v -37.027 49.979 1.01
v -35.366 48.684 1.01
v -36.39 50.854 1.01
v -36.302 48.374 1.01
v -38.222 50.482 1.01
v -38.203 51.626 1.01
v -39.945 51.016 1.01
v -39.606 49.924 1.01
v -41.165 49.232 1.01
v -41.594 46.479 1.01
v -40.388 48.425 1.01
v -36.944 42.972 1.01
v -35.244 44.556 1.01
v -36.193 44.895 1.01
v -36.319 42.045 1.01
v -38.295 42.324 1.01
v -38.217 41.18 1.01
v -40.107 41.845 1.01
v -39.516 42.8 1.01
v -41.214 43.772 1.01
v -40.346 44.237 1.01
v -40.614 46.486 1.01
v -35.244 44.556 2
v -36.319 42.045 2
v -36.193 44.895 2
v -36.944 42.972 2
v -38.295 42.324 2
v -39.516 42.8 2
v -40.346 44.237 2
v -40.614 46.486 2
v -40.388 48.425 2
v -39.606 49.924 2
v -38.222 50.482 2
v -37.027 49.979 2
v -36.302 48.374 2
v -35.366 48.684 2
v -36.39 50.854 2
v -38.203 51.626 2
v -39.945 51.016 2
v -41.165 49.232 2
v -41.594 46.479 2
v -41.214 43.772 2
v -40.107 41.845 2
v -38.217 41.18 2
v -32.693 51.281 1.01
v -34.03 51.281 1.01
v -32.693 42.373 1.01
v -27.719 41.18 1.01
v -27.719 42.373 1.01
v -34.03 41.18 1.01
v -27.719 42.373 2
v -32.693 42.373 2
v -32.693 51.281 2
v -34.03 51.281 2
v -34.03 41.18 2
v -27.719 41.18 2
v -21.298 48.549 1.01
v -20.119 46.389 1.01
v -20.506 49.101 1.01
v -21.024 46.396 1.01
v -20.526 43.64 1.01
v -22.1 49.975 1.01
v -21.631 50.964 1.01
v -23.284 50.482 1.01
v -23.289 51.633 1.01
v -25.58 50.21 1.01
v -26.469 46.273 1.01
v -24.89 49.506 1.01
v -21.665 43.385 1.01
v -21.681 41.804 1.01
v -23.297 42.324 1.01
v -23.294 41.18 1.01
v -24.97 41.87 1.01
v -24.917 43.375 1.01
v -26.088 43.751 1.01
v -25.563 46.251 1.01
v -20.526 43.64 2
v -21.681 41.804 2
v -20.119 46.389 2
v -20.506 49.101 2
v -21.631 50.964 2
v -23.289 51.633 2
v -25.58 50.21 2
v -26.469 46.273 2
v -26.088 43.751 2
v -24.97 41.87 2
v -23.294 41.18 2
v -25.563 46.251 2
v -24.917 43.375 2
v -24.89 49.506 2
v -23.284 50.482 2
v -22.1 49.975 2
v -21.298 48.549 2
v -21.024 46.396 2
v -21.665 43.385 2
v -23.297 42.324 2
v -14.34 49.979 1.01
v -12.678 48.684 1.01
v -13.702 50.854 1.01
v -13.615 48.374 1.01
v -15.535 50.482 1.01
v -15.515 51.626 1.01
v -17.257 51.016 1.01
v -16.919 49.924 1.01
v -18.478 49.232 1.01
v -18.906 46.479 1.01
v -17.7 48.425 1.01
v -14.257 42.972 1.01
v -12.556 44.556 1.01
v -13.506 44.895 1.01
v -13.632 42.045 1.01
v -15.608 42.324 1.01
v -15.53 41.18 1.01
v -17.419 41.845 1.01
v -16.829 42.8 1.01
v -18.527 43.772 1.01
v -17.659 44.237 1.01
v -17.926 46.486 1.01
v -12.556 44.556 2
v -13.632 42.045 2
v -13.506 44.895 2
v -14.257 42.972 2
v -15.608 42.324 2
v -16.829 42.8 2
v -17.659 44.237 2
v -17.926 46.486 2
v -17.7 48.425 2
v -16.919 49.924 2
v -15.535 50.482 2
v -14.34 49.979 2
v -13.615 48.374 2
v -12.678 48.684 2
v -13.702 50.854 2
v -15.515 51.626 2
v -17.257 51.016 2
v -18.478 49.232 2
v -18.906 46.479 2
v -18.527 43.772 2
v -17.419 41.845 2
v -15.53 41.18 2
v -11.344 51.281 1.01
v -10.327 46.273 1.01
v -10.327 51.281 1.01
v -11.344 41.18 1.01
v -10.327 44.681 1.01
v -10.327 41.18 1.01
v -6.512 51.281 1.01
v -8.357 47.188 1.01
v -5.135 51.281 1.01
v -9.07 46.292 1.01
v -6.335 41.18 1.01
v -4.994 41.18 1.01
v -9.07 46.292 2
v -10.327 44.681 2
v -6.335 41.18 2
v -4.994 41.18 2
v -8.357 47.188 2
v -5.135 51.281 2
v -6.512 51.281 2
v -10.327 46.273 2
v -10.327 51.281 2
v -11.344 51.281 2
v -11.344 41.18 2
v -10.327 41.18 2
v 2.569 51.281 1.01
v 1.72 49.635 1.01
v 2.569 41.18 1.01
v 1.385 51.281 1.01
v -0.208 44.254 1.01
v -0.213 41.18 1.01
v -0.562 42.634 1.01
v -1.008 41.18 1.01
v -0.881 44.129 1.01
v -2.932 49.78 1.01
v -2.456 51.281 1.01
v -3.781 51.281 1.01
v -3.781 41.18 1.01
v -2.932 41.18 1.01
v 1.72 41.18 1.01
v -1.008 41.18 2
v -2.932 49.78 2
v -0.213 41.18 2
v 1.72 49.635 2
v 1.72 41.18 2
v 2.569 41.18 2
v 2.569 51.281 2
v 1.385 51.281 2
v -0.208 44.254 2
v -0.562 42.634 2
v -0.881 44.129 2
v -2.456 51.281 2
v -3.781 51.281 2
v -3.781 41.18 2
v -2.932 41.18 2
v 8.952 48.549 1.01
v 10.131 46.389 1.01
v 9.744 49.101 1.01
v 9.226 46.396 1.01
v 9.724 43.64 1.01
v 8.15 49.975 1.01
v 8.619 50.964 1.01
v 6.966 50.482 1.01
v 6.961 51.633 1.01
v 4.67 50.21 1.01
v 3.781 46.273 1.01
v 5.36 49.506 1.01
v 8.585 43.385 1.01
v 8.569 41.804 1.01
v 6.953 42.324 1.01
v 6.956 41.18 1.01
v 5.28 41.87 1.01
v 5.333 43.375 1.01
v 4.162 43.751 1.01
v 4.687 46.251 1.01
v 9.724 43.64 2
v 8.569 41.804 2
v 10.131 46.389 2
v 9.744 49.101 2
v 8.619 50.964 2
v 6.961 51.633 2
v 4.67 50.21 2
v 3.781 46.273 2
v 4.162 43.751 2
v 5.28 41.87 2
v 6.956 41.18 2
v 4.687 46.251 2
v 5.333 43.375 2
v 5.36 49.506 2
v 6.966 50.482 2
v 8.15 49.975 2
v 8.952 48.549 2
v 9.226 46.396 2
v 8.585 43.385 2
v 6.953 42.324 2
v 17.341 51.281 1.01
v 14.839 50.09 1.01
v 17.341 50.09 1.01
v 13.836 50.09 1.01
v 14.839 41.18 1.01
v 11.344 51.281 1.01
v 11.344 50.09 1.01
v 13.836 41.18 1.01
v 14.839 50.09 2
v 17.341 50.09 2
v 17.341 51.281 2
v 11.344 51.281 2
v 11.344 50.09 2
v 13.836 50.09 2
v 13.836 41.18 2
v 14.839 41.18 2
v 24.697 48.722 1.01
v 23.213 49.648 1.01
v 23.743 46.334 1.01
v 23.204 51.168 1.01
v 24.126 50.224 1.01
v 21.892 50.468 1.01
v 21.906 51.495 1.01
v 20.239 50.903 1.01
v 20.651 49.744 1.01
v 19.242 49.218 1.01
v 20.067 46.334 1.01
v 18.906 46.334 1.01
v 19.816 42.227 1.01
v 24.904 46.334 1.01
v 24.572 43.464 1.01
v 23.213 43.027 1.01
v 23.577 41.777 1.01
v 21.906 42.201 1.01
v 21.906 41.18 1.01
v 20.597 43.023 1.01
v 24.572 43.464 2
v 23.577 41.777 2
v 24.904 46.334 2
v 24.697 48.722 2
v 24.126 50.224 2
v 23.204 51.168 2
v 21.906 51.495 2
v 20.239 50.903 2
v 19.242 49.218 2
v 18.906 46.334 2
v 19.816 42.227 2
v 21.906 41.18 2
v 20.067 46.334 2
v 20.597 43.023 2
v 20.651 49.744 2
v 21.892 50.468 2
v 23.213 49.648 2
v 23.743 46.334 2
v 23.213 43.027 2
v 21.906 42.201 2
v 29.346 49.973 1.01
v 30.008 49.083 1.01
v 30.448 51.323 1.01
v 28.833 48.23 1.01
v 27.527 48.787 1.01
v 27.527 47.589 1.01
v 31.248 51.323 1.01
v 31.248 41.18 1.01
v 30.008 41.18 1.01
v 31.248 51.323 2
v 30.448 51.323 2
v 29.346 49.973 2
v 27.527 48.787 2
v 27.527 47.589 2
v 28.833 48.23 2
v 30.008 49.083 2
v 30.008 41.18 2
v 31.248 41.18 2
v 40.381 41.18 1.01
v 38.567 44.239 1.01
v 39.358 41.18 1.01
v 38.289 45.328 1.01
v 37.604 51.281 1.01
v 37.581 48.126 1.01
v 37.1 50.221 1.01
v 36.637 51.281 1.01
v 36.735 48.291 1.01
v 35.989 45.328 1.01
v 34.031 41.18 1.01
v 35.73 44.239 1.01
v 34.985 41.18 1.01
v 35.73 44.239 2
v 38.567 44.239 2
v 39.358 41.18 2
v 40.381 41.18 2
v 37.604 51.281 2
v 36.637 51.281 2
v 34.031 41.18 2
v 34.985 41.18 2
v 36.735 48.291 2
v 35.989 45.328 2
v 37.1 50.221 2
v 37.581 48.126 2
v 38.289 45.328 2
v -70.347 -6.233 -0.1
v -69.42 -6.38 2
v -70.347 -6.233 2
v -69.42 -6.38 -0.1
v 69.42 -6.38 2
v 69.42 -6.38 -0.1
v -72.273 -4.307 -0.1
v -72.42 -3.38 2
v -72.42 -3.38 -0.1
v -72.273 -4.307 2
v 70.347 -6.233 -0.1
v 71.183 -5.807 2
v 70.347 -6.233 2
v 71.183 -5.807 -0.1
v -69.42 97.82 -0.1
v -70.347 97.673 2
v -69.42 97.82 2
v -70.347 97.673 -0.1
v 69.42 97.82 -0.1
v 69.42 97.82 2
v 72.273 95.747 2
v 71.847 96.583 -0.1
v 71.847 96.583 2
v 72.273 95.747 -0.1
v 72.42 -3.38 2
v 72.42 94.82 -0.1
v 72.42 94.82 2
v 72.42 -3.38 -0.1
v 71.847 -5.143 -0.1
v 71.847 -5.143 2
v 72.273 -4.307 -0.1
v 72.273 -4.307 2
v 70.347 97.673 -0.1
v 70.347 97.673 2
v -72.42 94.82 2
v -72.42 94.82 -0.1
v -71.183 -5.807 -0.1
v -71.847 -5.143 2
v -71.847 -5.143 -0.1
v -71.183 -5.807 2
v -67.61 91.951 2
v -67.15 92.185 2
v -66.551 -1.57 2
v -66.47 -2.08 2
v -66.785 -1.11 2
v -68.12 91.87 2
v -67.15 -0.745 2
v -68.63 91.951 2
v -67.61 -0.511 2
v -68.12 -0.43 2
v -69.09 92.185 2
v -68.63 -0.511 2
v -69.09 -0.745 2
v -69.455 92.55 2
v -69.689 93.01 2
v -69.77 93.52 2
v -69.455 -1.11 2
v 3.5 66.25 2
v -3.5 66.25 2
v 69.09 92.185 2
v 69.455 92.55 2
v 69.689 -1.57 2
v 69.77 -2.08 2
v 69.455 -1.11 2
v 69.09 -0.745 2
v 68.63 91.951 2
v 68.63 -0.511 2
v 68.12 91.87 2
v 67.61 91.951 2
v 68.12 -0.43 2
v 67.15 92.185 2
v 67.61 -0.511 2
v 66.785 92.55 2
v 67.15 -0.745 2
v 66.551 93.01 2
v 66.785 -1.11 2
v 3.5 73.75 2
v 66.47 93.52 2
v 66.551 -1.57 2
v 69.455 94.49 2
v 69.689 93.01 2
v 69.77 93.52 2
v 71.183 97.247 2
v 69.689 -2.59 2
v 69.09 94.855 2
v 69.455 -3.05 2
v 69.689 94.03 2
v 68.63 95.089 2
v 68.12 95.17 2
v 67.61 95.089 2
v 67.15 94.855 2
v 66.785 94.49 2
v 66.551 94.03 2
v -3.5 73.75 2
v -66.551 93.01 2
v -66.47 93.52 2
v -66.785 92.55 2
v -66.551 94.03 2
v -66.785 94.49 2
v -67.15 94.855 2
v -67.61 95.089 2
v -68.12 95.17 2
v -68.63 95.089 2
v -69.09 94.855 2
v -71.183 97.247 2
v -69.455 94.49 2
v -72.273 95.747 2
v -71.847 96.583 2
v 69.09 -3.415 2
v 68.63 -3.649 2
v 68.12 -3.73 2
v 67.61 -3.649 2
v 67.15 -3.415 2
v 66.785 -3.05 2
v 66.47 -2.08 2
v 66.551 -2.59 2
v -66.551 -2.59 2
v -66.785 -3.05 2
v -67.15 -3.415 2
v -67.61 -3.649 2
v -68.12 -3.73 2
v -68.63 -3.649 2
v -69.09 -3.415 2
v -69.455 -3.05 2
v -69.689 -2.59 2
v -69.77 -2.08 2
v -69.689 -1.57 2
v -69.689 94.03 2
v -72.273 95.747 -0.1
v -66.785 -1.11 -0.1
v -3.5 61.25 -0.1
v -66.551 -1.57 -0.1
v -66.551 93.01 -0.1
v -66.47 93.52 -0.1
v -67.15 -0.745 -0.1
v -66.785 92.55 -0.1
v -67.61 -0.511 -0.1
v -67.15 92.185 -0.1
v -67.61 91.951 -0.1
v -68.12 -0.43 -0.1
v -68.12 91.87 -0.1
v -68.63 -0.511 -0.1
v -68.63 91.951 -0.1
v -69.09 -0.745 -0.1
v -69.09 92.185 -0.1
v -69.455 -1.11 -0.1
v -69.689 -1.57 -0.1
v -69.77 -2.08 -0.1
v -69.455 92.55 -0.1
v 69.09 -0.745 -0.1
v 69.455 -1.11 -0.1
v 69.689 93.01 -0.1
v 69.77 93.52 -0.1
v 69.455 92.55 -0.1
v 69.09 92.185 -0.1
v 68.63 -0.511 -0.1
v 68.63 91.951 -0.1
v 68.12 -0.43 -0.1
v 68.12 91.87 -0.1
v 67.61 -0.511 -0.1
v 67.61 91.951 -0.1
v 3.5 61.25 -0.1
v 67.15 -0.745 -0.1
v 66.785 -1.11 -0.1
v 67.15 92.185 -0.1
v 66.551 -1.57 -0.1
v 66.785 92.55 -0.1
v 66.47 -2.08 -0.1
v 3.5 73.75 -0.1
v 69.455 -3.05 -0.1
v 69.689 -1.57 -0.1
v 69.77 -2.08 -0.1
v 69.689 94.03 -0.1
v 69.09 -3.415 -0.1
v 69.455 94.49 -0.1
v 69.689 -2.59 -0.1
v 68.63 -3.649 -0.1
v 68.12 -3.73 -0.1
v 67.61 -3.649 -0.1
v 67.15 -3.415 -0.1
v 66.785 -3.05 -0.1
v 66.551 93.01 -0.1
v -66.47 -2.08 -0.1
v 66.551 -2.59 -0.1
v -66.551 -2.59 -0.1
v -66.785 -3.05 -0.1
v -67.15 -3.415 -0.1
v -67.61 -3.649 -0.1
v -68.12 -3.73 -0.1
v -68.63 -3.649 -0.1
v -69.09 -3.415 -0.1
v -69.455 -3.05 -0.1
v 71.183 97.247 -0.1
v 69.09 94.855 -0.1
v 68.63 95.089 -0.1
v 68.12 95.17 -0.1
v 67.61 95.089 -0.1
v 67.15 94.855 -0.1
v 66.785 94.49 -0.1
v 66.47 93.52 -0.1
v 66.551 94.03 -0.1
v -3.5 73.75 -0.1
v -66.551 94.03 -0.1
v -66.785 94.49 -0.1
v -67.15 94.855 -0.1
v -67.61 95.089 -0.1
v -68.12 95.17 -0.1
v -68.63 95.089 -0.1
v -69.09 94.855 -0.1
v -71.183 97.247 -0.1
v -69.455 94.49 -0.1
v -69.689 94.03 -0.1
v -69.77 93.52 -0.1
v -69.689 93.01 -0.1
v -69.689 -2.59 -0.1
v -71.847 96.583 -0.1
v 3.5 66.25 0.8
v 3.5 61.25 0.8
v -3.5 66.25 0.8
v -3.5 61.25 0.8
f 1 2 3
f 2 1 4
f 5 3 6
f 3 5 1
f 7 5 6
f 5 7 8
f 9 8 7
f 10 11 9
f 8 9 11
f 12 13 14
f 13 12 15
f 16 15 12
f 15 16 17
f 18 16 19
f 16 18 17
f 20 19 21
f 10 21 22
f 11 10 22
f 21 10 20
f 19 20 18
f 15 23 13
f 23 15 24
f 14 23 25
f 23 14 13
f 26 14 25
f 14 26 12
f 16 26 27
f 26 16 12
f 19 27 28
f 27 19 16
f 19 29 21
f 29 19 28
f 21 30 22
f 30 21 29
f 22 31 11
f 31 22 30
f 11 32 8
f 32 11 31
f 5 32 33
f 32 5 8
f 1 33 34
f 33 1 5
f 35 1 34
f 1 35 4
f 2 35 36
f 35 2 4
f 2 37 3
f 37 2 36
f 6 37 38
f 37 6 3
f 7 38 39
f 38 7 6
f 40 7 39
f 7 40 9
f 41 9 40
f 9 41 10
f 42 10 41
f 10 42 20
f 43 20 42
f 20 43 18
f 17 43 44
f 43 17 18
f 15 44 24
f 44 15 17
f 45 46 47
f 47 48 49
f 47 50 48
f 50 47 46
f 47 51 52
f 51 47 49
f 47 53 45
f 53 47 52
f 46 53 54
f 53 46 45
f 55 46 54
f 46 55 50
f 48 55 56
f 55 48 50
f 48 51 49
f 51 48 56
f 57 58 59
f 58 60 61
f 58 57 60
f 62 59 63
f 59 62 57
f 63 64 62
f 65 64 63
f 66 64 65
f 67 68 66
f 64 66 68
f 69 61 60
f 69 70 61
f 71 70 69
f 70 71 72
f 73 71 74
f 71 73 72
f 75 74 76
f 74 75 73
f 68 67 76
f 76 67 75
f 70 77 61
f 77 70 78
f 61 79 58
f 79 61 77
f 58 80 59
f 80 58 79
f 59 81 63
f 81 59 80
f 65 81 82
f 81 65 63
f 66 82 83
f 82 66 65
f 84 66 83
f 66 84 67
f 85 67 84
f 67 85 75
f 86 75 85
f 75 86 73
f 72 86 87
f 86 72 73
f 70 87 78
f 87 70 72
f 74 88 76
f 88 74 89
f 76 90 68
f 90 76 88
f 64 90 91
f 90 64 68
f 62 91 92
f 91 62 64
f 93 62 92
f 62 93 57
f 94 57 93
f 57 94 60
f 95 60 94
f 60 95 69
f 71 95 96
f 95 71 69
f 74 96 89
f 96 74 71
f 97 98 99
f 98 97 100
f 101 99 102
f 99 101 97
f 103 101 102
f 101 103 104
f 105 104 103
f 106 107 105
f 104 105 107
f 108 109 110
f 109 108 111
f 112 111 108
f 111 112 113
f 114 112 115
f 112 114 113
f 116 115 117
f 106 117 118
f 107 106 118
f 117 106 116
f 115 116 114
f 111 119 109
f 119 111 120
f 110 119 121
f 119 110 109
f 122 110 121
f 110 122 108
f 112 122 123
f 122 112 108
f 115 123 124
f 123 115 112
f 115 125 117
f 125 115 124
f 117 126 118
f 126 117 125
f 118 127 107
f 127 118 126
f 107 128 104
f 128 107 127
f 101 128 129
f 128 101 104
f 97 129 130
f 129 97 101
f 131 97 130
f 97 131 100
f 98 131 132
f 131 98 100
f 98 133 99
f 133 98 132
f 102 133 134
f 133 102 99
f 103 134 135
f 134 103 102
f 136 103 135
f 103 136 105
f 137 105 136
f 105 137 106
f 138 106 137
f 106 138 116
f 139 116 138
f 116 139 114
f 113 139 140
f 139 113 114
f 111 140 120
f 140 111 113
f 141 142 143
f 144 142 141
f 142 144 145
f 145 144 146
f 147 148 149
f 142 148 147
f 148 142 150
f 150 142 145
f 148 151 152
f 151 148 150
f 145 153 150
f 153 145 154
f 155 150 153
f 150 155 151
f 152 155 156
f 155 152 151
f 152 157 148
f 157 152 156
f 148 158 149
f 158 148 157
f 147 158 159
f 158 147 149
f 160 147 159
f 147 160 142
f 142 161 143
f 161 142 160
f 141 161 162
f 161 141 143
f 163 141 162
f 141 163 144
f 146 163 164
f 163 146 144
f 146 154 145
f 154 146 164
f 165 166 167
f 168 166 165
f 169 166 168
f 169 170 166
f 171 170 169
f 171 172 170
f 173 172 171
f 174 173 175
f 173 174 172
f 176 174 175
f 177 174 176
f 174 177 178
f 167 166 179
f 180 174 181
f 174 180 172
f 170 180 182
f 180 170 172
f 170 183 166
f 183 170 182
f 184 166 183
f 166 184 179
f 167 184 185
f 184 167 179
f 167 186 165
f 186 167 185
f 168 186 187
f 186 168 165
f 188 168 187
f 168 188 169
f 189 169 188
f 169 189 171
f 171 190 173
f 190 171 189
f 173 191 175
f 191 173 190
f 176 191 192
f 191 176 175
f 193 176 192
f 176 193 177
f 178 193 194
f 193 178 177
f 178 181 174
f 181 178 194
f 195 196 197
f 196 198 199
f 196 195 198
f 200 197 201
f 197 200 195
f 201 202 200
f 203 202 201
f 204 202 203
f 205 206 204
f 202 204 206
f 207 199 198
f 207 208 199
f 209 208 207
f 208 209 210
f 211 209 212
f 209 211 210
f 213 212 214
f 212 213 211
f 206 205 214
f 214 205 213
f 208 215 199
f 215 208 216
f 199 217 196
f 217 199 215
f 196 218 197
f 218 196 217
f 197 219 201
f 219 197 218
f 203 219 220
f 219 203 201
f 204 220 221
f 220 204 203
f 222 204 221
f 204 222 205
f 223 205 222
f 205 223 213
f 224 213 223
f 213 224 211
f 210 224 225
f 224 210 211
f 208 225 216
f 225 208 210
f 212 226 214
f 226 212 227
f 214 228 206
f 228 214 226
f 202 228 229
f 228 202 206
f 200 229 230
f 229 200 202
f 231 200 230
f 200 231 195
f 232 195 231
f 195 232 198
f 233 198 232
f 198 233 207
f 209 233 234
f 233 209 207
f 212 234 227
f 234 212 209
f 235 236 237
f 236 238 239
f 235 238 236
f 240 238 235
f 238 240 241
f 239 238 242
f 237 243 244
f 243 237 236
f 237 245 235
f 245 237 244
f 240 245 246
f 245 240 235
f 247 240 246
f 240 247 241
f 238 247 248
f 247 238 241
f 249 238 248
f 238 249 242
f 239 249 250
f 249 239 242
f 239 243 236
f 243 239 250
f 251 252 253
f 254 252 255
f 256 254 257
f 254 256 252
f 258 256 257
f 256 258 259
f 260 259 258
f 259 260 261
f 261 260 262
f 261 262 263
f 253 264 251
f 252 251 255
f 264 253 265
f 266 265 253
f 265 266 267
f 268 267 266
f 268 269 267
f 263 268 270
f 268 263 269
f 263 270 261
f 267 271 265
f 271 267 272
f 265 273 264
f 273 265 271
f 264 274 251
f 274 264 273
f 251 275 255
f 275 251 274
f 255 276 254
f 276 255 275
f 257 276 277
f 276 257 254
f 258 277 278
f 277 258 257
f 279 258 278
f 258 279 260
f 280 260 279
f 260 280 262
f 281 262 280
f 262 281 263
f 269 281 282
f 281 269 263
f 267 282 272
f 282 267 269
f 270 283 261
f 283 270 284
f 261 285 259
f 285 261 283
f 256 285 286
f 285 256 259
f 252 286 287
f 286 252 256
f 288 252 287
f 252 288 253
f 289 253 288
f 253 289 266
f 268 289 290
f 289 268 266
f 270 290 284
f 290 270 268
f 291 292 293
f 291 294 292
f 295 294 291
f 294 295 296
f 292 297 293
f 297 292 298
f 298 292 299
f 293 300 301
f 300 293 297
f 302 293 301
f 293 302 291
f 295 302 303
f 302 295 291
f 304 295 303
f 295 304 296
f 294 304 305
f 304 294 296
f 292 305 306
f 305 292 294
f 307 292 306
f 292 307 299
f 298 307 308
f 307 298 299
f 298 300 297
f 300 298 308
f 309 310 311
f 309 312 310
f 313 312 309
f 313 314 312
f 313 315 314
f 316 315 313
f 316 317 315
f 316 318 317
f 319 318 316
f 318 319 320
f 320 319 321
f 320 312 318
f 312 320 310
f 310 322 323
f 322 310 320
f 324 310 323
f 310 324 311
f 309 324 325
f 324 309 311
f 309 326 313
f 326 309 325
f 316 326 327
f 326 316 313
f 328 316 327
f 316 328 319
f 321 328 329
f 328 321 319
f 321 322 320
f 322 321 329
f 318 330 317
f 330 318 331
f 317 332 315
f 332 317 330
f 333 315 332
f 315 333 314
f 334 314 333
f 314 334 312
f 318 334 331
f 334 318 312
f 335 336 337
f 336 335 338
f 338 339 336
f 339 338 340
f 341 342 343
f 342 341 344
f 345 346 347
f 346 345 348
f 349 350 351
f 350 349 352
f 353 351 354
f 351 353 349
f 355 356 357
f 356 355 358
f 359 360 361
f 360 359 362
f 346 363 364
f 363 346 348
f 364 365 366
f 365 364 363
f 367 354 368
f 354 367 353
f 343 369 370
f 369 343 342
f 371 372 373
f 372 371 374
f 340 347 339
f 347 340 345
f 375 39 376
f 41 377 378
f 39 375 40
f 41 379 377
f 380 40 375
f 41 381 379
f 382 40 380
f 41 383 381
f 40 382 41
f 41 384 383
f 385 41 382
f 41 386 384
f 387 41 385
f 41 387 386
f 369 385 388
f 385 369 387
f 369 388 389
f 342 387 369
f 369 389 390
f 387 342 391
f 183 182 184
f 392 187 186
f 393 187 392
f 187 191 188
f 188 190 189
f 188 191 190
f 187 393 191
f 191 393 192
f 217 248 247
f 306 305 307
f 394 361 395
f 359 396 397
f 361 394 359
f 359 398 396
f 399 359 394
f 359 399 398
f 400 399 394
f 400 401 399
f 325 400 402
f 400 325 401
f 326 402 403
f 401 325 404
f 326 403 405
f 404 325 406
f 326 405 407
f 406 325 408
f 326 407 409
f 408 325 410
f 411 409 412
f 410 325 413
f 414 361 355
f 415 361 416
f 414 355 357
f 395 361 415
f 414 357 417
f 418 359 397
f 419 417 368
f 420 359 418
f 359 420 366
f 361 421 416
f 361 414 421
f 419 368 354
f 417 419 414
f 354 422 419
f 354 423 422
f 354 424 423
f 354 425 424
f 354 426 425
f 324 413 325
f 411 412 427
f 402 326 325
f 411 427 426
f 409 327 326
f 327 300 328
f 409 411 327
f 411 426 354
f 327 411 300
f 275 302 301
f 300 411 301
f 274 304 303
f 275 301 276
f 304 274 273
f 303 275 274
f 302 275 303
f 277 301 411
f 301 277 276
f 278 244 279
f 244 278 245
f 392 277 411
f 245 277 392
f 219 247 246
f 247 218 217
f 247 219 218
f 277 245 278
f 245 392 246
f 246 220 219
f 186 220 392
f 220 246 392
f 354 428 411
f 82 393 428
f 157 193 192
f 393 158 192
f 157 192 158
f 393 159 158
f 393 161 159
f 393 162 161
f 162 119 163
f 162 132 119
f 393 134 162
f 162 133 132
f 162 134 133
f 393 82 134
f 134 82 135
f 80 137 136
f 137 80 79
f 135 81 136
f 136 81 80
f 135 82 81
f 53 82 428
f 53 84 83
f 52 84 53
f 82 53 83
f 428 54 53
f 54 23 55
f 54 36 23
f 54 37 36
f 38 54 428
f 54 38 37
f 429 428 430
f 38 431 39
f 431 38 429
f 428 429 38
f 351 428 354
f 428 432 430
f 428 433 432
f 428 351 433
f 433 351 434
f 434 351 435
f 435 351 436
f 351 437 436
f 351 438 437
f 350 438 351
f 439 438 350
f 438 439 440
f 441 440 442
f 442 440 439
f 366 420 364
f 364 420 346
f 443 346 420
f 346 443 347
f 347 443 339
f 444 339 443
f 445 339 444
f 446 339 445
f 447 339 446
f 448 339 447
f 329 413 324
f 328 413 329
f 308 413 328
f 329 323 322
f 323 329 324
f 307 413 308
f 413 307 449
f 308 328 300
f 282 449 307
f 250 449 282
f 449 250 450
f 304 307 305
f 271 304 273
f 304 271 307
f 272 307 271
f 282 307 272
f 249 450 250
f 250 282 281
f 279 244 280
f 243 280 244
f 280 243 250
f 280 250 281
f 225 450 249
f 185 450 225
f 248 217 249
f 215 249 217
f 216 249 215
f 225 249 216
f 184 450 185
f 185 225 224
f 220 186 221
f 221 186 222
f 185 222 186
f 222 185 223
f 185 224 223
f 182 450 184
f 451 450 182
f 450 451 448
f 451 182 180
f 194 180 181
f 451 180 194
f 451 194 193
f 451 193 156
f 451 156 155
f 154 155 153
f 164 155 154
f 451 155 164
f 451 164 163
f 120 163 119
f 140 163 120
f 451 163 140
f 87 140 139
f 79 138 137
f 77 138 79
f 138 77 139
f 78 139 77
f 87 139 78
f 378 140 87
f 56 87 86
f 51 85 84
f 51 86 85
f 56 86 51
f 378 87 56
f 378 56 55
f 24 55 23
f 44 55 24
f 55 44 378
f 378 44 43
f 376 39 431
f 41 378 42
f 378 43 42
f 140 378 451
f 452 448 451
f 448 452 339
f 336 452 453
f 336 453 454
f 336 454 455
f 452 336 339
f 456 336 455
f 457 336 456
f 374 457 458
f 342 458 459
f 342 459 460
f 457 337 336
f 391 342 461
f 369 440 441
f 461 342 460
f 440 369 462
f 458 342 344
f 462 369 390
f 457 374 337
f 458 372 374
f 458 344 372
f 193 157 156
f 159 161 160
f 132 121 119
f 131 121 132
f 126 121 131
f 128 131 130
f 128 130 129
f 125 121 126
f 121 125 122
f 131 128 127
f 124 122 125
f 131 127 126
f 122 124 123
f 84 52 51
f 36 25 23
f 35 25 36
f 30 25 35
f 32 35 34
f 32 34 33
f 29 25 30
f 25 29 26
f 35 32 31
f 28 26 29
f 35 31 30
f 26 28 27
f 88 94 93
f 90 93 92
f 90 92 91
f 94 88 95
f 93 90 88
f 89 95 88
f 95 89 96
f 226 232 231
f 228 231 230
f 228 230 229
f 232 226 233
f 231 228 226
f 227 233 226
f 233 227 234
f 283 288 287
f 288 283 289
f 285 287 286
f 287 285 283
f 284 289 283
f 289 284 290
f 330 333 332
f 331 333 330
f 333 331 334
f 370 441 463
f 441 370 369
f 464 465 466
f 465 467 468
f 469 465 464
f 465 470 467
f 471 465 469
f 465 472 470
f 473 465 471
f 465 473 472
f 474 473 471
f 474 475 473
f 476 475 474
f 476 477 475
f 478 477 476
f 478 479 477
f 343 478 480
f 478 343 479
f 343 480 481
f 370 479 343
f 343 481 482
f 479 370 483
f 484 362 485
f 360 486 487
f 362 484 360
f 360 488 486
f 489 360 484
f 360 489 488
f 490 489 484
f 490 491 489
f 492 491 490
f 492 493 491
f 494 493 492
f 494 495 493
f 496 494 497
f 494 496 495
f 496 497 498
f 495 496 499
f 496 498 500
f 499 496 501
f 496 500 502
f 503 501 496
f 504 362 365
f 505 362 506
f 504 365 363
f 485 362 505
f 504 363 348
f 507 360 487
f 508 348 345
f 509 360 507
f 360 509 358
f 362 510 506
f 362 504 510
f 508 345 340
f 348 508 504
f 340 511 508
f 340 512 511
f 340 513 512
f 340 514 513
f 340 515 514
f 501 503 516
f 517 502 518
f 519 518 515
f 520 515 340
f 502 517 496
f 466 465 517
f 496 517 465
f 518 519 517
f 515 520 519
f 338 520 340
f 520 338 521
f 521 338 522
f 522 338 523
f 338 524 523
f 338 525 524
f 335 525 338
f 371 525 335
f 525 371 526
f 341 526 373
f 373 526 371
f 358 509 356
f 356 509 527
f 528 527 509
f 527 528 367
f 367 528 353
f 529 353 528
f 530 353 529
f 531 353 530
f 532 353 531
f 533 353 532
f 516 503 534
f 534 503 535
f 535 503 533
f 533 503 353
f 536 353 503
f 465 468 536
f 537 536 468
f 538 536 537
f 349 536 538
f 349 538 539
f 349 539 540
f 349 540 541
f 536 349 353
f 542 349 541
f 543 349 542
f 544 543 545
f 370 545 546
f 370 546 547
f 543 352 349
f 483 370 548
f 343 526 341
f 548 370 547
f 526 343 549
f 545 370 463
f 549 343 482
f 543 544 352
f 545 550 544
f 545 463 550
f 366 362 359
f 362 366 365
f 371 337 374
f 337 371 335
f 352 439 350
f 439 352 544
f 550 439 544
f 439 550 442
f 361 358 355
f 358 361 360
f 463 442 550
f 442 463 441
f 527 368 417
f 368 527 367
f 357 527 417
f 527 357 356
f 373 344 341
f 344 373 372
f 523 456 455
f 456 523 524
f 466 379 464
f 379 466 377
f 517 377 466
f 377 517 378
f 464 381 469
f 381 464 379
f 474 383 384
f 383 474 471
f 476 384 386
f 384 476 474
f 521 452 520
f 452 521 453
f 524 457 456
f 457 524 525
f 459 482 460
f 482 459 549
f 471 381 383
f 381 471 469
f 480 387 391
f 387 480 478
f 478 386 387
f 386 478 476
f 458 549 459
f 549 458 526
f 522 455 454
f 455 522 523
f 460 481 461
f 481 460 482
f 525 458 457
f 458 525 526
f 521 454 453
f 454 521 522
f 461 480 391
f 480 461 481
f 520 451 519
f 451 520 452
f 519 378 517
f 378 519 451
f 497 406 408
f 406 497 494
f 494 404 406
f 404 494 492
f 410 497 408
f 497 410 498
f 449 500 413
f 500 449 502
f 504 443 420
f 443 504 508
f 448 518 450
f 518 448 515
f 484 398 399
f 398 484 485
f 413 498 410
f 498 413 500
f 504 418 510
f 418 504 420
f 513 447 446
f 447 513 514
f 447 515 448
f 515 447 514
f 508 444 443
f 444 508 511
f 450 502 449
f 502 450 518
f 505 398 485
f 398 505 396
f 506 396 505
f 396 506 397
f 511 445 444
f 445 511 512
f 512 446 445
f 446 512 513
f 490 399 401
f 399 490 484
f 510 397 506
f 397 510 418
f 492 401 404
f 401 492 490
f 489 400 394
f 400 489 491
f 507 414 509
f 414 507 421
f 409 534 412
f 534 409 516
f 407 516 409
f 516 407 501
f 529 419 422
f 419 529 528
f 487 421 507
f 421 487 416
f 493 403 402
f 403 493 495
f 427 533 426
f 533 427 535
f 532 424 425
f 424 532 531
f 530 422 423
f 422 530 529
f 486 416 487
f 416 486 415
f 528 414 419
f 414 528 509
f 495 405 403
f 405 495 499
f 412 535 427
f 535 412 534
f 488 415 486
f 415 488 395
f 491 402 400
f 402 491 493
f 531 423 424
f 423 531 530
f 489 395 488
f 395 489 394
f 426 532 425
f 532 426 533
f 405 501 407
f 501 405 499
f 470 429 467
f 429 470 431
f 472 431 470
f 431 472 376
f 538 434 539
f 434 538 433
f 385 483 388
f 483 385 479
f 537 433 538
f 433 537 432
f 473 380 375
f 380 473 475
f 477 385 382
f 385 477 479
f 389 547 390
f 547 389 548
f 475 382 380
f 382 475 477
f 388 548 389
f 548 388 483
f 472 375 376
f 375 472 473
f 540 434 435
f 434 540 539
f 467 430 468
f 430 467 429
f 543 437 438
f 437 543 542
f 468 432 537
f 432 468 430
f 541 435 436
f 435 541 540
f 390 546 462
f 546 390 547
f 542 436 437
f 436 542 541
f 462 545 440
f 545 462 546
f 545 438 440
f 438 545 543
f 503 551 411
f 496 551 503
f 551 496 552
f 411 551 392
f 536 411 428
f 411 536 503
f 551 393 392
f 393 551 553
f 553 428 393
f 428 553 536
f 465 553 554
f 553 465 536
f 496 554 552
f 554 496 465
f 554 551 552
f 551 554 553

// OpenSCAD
// file: ../src/otvory.scad
//Funkce otvuru pro ruzne prvky umistene do celicek

/*OBSAHUJE
    1A)
    1B)
    1C) - Pro modul USBI2C01A
    1D) - Pro konektor MIC338
    1E) - Pro modul UNIPOWER02A
    1F) - Pro modul I2CDIFF01A
    1G) - Pro modul UNIPOWER03A
    1H) - Větrací otvor
    
    2A) - Otvor na IR
*/


/*1C) - Pro modul USBI2C01A
--------------------------------------------------------
--------------------------------------------------------
pocet_der_dane_strany - protoze nelze definovat na jake strane bude dira umistena, proto se musí rucne zadat pocet der zvolene strany krabicky
posun_od_okraje - zadava se o kolik der se ma posunot modul od kraje celicka
vzdalenost_der - definuje roztec der

modul na dvou matkách má vysku 6.5 mm, pokud nebudo zasahne do nastaveni list krabicky, bude nutno zvednout vysku modulu.

*/

module USBI2C01A(tloustka_bocnice,vzdalenost_der) //uz upraveno
{
 USBI2C01A_sirka_kon=12; //sirka konektoru
 USBI2C01A_vyska_kon=11; //vyska konektoru
 USBI2C01A_sirka_mod_otvory=3; //kolik modul zabira der
 USBI2C01A_svyska_nad_plbase=6; //kolik modul zabira der   
   translate([vzdalenost_der*(USBI2C01A_sirka_mod_otvory-1)/2,0,USBI2C01A_vyska_kon/2+USBI2C01A_svyska_nad_plbase])
   cube(size = [USBI2C01A_sirka_kon,tloustka_bocnice+0.2,USBI2C01A_vyska_kon], center = true);  
    
}

/*1D) - Pro konektor MIC338
--------------------------------------------------------
--------------------------------------------------------
*/
//posun_od_okraje - zadava se o kolik der se ma posunot otvor od středu celicka v nasobcich roztece der

module MIC338(tloustka_bocnice,vzdalenost_der,vyska_bocnice)
{
 MIC338_polomer_kon=8; //polomer montazniho otvoru
   translate([0,0,vyska_bocnice/2])
        rotate(a=[90,0,0])
            cylinder(h=tloustka_bocnice+0.1, r=MIC338_polomer_kon+0.1, center=true);  
    
}

/*1E) - Pro modul UNIPOWER02A
--------------------------------------------------------
--------------------------------------------------------
pocet_der_dane_strany - protoze nelze definovat na jake strane bude dira umistena, proto se musí rucne zadat pocet der zvolene strany krabicky
posun_od_okraje - zadava se o kolik der se ma posunot modul od kraje celicka
vzdalenost_der - definuje rozec der

modul na dvou matkách má vysku 6.5 mm, pokud nebudo zasahne do nastaveni list krabicky, bude nutno zvednout vysku modulu.

*/



module UNIPOWER02A(tloustka_bocnice,vzdalenost_der)
{
 UNIPOWER02A_sirka_kon=10; //sirka konektoru
 UNIPOWER02A_vyska_kon=11; //vyska konektoru
 UNIPOWER02A_sirka_mod_otvory=4; //kolik modul zabira der
 UNIPOWER02A_vzdalenost_konektoru=6; //vzdalenost kraje konektoru od středu šroubu
    UNIPOWER02A_vyska_nad_plbase=6; //vyska mezi albase a konektorem
   translate([UNIPOWER02A_vzdalenost_konektoru,-tloustka_bocnice/2-0.05,UNIPOWER02A_vyska_nad_plbase])
   cube(size = [UNIPOWER02A_sirka_kon,tloustka_bocnice+0.1,UNIPOWER02A_vyska_kon], center = false);
 }   
 
/*1F) - Pro modul I2CDIFF01A
--------------------------------------------------------
--------------------------------------------------------
pocet_der_dane_strany - protoze nelze definovat na jake strane bude dira umistena, proto se musí rucne zadat pocet der zvolene strany krabicky
posun_od_okraje - zadava se o kolik der se ma posunot modul od kraje celicka
vzdalenost_der - definuje roztec der

modul na dvou matkách má vysku 6.5 mm, pokud nebudo zasahne do nastaveni list krabicky, bude nutno zvednout vysku modulu.

*/


module I2CDIFF01A(tloustka_bocnice,vzdalenost_der) //uz upraveno
{
 I2CDIFF01A_sirka_kon=16.5; //sirka konektoru
 I2CDIFF01A_vyska_kon=13.5; //vyska konektoru
 I2CDIFF01A_sirka_mod_otvory=4; //kolik modul zabira der
 I2CDIFF01A_vyska_nad_plbase=6; //vyska mezi albase a konektorem
   translate([vzdalenost_der*(I2CDIFF01A_sirka_mod_otvory-1)/2,0,I2CDIFF01A_vyska_kon/2+I2CDIFF01A_vyska_nad_plbase])
   cube(size = [I2CDIFF01A_sirka_kon,tloustka_bocnice+0.2,I2CDIFF01A_vyska_kon], center = true);  
    
}
 

/*1G) - Pro modul UNIPOWER03A
--------------------------------------------------------
--------------------------------------------------------

*/

module UNIPOWER03A(tloustka_bocnice,vzdalenost_der)
{
 UNIPOWER03A_sirka_kon=10; //sirka konektoru
 UNIPOWER03A_vyska_kon=11; //vyska konektoru
 UNIPOWER03A_sirka_mod_otvory=4; //kolik modul zabira der
 UNIPOWER03A_vzdalenost_konektoru=5; //vzdalenost kraje konektoru od středu šroubu
    UNIPOWER03A_vyska_nad_plbase=6; //vyska mezi albase a konektorem
    
    
   translate([(UNIPOWER03A_sirka_mod_otvory-1)*vzdalenost_der-UNIPOWER03A_sirka_kon-UNIPOWER03A_vzdalenost_konektoru,-tloustka_bocnice/2-0.05,UNIPOWER03A_vyska_nad_plbase])
   cube(size = [UNIPOWER03A_sirka_kon,tloustka_bocnice+0.1,UNIPOWER03A_vyska_kon], center = false);
 }  
 

 /*1G) - OTVOR PRO VETRANI
--------------------------------------------------------
--------------------------------------------------------

*/
 module CHLADICI_OTVORY(tloustka_bocnice,vzdalenost_der,delka,vyska_bocnice)
{
CHLADICI_OTVORY_mezera=0.6; 
CHLADICI_OTVORY_snizeni_vysky=10; 
CHLADICI_OTVORY_prekryti=1.2;     
    
   for (a =[1:delka]) 
     translate([vzdalenost_der*(a-1),0,0])  
   {   
  union() {
   translate([CHLADICI_OTVORY_prekryti/2,-CHLADICI_OTVORY_mezera/2+0.005,CHLADICI_OTVORY_snizeni_vysky/2])
   cube(size = [(vzdalenost_der-2*CHLADICI_OTVORY_prekryti)/2,(tloustka_bocnice+CHLADICI_OTVORY_mezera)/2,vyska_bocnice-CHLADICI_OTVORY_snizeni_vysky], center = false);
    
     translate([(vzdalenost_der+CHLADICI_OTVORY_prekryti)/2,-tloustka_bocnice/2-0.005,CHLADICI_OTVORY_snizeni_vysky/2])
   cube(size = [(vzdalenost_der-2*CHLADICI_OTVORY_prekryti)/2,(tloustka_bocnice+CHLADICI_OTVORY_mezera)/2,vyska_bocnice-CHLADICI_OTVORY_snizeni_vysky], center = false);
    
    
    translate([(vzdalenost_der-CHLADICI_OTVORY_prekryti)/2,-CHLADICI_OTVORY_mezera/2,CHLADICI_OTVORY_snizeni_vysky/2])
    cube(size = [CHLADICI_OTVORY_prekryti,CHLADICI_OTVORY_mezera,vyska_bocnice-CHLADICI_OTVORY_snizeni_vysky], center = false);
      
    translate([(vzdalenost_der-CHLADICI_OTVORY_prekryti)/2+vzdalenost_der/2,-CHLADICI_OTVORY_mezera/2,CHLADICI_OTVORY_snizeni_vysky/2])
    cube(size = [CHLADICI_OTVORY_prekryti+1,CHLADICI_OTVORY_mezera,vyska_bocnice-CHLADICI_OTVORY_snizeni_vysky], center = false);  
 }
 }
 }
 
 
 /*2A) - OTVOR PRO IR
--------------------------------------------------------
--------------------------------------------------------

*/
 
 module IR(tloustka_bocnice,vyska_bocnice)
{
    IR_sirka_kon=7; //sirka senzoru
    IR_vyska_kon=7.5; //vyska senzoru
    IR_hloubka_venkovni=1.2; //sila senzoru od vodičů ven
    IR_vyska_pro_vodice=5; 
    
    
   translate([0,-tloustka_bocnice/2-0.01,vyska_bocnice/2-IR_vyska_kon/2])
   cube(size = [IR_sirka_kon,IR_hloubka_venkovni+0.1,IR_vyska_kon], center = false);
    
    translate([0,-(tloustka_bocnice/2-IR_hloubka_venkovni),vyska_bocnice/2-IR_vyska_kon/2-IR_vyska_pro_vodice])
   cube(size = [IR_sirka_kon,tloustka_bocnice,IR_vyska_kon+IR_vyska_pro_vodice], center = false);
 } 
 
 
 module OTVOR_NA_PRUDUCH(tloustka_bocnice,vzdalenost_der,delka,vyska_bocnice)
{
OTVOR_NA_PRUDUCH_vzdalenost_od_kraje=5; 
    
    
  
     translate([0,-0.05-tloustka_bocnice/2,OTVOR_NA_PRUDUCH_vzdalenost_od_kraje])  
      
  
   cube(size = [vzdalenost_der*(delka),tloustka_bocnice+0.1,vyska_bocnice-2*OTVOR_NA_PRUDUCH_vzdalenost_od_kraje], center = false);
    
     
 
 
 }
 
 
 module CHLADICI_OTVORY2(tloustka_bocnice,vzdalenost_der,delka,vyska_bocnice)
{
CHLADICI_OTVORY2_mezera=1.0; 
CHLADICI_OTVORY2_snizeni_vysky=10; 
    
    
   for (a =[1:delka]) 
     translate([vzdalenost_der*(a-1),0,0])  
   {   

   translate([vzdalenost_der/2,-0.05-tloustka_bocnice/2,CHLADICI_OTVORY2_snizeni_vysky/2])
   cube(size = [CHLADICI_OTVORY2_mezera,tloustka_bocnice+0.1,vyska_bocnice-CHLADICI_OTVORY2_snizeni_vysky], center = false);
    
     
 
 }
 }
// file: ../src/otvory_conf.scad
//Konfigurace pro otvory

//1B) - LCD 2x16
//vzdalenost der
vzdalenost_der_x = 75;
vzdalenost_der_y = 31;
prumer_otvoru = 2.7;
prumer_sloupku = 5;

//ramecek LCD
ramecek_x = 72;
ramecek_y = 23;

//vyska ramecku LCD
ramecek_vyska = 5;
// file: ../configuration.scad
//Název boxu (zařízení)
box_jmeno="CLOCKMOT01A";

//ALBASE1115
//------------------------------------------------------------
///*
vzdalenost_der = 10.16; //rozteč děr mezi sebou
radidus_hrany = 3; //radius zaobleni sloupku

//parametry lišty
vzdalenost_od_okraje = 5.08; //vzdalenost stredu upevnovaci diry od kraje desky

//mala hrana
pocet_der1 = 10; //pocet děr v ose y

//velka hrana
pocet_der2 = 14; //pocet der v ose x
//*/


//OBECNE PARAMETRY KRABICKY
//------------------------------------------------------------
//BOCNICE
vyska_bocnice=40;
tloustka_bocnice=3;

//PLBASE PARAMETRY
//------------------------------------------------------------
tloustka_plbase = 2; //tloustka plbase
prekryti_der=0.3; //sila materiálu, který překrývá díry

plbase_tolerance_horni=0.5; //pro zvětšení tolerance aby tam šlo dát  horní čelíčko

//PRIPADNA VYSKA NOZICEK
//------------------------------------------------------------
vyska_nozicky=5;

//Rozmery loga MLAB
//------------------------------------------------------------
logo_vyska=0.15;
logo_sirka=0.15;
// file: ../src/manufactury_conf.scad
$fn=20; // model faces resolution.

 //Sroub - podpěra pro tisk sloupku
        vyska_podpery=12;
        vyska_mat_pod_matici=3;

//Sroub - parametry
vyska_hlavy = 3.5;
prumer_hlavy=6;
prumer_sroubu=3.3;

//Matice - parametry
prumer_matice=6; //hrany k hraně
vyska_matice=3;  //vyska matice
posuv_dorazu=1;  //pro moznost posuvu dorazu pro vsunutí matice
matice_sila_materialu=2; //sila materialu pod maticí na ose z


//Lišta parametry
//---------------------------------------------------
//rozměry výrezu v ose y
vzdalenost_od_diry = 5; //vzdalenost od stredu upevnovaci diry na druhou stranu


//Spodní Kryt
vyska_prekryti_spodni=3;
vyska_prekryti_vrchni=4;
prekryti_tolerance=0.6;
tolerance_na_nasunuti=0.3;
sila_spodniho_krytu=1;

//Pro vrchni PLBASE
hrana_bocnice=1.2; //udává jaká síla bocnice zůstane v části zapustěni vrchního čelička
// main file
use <../src/plbase.scad>



include <../src/manufactury_conf.scad>
include <../configuration.scad>
include <../src/otvory_conf.scad>
use <../src/otvory.scad>

difference()  {
 translate([0,0,tloustka_plbase/2])
rotate(a=[0,0,0])
    {
        
       plbase_vrchni_kryt_pro_odecet(pocet_der1-1,pocet_der2-1,radidus_hrany,vzdalenost_der,vzdalenost_od_okraje,prumer_sroubu,vyska_bocnice,prekryti_der,tloustka_bocnice,plbase_tolerance_horni,tloustka_plbase);
   
        
        
     }
translate([-3.5,50,1])    
   rotate(a=[-90,0,0])     
   IR(tloustka_plbase,vyska_bocnice);      
     
}
